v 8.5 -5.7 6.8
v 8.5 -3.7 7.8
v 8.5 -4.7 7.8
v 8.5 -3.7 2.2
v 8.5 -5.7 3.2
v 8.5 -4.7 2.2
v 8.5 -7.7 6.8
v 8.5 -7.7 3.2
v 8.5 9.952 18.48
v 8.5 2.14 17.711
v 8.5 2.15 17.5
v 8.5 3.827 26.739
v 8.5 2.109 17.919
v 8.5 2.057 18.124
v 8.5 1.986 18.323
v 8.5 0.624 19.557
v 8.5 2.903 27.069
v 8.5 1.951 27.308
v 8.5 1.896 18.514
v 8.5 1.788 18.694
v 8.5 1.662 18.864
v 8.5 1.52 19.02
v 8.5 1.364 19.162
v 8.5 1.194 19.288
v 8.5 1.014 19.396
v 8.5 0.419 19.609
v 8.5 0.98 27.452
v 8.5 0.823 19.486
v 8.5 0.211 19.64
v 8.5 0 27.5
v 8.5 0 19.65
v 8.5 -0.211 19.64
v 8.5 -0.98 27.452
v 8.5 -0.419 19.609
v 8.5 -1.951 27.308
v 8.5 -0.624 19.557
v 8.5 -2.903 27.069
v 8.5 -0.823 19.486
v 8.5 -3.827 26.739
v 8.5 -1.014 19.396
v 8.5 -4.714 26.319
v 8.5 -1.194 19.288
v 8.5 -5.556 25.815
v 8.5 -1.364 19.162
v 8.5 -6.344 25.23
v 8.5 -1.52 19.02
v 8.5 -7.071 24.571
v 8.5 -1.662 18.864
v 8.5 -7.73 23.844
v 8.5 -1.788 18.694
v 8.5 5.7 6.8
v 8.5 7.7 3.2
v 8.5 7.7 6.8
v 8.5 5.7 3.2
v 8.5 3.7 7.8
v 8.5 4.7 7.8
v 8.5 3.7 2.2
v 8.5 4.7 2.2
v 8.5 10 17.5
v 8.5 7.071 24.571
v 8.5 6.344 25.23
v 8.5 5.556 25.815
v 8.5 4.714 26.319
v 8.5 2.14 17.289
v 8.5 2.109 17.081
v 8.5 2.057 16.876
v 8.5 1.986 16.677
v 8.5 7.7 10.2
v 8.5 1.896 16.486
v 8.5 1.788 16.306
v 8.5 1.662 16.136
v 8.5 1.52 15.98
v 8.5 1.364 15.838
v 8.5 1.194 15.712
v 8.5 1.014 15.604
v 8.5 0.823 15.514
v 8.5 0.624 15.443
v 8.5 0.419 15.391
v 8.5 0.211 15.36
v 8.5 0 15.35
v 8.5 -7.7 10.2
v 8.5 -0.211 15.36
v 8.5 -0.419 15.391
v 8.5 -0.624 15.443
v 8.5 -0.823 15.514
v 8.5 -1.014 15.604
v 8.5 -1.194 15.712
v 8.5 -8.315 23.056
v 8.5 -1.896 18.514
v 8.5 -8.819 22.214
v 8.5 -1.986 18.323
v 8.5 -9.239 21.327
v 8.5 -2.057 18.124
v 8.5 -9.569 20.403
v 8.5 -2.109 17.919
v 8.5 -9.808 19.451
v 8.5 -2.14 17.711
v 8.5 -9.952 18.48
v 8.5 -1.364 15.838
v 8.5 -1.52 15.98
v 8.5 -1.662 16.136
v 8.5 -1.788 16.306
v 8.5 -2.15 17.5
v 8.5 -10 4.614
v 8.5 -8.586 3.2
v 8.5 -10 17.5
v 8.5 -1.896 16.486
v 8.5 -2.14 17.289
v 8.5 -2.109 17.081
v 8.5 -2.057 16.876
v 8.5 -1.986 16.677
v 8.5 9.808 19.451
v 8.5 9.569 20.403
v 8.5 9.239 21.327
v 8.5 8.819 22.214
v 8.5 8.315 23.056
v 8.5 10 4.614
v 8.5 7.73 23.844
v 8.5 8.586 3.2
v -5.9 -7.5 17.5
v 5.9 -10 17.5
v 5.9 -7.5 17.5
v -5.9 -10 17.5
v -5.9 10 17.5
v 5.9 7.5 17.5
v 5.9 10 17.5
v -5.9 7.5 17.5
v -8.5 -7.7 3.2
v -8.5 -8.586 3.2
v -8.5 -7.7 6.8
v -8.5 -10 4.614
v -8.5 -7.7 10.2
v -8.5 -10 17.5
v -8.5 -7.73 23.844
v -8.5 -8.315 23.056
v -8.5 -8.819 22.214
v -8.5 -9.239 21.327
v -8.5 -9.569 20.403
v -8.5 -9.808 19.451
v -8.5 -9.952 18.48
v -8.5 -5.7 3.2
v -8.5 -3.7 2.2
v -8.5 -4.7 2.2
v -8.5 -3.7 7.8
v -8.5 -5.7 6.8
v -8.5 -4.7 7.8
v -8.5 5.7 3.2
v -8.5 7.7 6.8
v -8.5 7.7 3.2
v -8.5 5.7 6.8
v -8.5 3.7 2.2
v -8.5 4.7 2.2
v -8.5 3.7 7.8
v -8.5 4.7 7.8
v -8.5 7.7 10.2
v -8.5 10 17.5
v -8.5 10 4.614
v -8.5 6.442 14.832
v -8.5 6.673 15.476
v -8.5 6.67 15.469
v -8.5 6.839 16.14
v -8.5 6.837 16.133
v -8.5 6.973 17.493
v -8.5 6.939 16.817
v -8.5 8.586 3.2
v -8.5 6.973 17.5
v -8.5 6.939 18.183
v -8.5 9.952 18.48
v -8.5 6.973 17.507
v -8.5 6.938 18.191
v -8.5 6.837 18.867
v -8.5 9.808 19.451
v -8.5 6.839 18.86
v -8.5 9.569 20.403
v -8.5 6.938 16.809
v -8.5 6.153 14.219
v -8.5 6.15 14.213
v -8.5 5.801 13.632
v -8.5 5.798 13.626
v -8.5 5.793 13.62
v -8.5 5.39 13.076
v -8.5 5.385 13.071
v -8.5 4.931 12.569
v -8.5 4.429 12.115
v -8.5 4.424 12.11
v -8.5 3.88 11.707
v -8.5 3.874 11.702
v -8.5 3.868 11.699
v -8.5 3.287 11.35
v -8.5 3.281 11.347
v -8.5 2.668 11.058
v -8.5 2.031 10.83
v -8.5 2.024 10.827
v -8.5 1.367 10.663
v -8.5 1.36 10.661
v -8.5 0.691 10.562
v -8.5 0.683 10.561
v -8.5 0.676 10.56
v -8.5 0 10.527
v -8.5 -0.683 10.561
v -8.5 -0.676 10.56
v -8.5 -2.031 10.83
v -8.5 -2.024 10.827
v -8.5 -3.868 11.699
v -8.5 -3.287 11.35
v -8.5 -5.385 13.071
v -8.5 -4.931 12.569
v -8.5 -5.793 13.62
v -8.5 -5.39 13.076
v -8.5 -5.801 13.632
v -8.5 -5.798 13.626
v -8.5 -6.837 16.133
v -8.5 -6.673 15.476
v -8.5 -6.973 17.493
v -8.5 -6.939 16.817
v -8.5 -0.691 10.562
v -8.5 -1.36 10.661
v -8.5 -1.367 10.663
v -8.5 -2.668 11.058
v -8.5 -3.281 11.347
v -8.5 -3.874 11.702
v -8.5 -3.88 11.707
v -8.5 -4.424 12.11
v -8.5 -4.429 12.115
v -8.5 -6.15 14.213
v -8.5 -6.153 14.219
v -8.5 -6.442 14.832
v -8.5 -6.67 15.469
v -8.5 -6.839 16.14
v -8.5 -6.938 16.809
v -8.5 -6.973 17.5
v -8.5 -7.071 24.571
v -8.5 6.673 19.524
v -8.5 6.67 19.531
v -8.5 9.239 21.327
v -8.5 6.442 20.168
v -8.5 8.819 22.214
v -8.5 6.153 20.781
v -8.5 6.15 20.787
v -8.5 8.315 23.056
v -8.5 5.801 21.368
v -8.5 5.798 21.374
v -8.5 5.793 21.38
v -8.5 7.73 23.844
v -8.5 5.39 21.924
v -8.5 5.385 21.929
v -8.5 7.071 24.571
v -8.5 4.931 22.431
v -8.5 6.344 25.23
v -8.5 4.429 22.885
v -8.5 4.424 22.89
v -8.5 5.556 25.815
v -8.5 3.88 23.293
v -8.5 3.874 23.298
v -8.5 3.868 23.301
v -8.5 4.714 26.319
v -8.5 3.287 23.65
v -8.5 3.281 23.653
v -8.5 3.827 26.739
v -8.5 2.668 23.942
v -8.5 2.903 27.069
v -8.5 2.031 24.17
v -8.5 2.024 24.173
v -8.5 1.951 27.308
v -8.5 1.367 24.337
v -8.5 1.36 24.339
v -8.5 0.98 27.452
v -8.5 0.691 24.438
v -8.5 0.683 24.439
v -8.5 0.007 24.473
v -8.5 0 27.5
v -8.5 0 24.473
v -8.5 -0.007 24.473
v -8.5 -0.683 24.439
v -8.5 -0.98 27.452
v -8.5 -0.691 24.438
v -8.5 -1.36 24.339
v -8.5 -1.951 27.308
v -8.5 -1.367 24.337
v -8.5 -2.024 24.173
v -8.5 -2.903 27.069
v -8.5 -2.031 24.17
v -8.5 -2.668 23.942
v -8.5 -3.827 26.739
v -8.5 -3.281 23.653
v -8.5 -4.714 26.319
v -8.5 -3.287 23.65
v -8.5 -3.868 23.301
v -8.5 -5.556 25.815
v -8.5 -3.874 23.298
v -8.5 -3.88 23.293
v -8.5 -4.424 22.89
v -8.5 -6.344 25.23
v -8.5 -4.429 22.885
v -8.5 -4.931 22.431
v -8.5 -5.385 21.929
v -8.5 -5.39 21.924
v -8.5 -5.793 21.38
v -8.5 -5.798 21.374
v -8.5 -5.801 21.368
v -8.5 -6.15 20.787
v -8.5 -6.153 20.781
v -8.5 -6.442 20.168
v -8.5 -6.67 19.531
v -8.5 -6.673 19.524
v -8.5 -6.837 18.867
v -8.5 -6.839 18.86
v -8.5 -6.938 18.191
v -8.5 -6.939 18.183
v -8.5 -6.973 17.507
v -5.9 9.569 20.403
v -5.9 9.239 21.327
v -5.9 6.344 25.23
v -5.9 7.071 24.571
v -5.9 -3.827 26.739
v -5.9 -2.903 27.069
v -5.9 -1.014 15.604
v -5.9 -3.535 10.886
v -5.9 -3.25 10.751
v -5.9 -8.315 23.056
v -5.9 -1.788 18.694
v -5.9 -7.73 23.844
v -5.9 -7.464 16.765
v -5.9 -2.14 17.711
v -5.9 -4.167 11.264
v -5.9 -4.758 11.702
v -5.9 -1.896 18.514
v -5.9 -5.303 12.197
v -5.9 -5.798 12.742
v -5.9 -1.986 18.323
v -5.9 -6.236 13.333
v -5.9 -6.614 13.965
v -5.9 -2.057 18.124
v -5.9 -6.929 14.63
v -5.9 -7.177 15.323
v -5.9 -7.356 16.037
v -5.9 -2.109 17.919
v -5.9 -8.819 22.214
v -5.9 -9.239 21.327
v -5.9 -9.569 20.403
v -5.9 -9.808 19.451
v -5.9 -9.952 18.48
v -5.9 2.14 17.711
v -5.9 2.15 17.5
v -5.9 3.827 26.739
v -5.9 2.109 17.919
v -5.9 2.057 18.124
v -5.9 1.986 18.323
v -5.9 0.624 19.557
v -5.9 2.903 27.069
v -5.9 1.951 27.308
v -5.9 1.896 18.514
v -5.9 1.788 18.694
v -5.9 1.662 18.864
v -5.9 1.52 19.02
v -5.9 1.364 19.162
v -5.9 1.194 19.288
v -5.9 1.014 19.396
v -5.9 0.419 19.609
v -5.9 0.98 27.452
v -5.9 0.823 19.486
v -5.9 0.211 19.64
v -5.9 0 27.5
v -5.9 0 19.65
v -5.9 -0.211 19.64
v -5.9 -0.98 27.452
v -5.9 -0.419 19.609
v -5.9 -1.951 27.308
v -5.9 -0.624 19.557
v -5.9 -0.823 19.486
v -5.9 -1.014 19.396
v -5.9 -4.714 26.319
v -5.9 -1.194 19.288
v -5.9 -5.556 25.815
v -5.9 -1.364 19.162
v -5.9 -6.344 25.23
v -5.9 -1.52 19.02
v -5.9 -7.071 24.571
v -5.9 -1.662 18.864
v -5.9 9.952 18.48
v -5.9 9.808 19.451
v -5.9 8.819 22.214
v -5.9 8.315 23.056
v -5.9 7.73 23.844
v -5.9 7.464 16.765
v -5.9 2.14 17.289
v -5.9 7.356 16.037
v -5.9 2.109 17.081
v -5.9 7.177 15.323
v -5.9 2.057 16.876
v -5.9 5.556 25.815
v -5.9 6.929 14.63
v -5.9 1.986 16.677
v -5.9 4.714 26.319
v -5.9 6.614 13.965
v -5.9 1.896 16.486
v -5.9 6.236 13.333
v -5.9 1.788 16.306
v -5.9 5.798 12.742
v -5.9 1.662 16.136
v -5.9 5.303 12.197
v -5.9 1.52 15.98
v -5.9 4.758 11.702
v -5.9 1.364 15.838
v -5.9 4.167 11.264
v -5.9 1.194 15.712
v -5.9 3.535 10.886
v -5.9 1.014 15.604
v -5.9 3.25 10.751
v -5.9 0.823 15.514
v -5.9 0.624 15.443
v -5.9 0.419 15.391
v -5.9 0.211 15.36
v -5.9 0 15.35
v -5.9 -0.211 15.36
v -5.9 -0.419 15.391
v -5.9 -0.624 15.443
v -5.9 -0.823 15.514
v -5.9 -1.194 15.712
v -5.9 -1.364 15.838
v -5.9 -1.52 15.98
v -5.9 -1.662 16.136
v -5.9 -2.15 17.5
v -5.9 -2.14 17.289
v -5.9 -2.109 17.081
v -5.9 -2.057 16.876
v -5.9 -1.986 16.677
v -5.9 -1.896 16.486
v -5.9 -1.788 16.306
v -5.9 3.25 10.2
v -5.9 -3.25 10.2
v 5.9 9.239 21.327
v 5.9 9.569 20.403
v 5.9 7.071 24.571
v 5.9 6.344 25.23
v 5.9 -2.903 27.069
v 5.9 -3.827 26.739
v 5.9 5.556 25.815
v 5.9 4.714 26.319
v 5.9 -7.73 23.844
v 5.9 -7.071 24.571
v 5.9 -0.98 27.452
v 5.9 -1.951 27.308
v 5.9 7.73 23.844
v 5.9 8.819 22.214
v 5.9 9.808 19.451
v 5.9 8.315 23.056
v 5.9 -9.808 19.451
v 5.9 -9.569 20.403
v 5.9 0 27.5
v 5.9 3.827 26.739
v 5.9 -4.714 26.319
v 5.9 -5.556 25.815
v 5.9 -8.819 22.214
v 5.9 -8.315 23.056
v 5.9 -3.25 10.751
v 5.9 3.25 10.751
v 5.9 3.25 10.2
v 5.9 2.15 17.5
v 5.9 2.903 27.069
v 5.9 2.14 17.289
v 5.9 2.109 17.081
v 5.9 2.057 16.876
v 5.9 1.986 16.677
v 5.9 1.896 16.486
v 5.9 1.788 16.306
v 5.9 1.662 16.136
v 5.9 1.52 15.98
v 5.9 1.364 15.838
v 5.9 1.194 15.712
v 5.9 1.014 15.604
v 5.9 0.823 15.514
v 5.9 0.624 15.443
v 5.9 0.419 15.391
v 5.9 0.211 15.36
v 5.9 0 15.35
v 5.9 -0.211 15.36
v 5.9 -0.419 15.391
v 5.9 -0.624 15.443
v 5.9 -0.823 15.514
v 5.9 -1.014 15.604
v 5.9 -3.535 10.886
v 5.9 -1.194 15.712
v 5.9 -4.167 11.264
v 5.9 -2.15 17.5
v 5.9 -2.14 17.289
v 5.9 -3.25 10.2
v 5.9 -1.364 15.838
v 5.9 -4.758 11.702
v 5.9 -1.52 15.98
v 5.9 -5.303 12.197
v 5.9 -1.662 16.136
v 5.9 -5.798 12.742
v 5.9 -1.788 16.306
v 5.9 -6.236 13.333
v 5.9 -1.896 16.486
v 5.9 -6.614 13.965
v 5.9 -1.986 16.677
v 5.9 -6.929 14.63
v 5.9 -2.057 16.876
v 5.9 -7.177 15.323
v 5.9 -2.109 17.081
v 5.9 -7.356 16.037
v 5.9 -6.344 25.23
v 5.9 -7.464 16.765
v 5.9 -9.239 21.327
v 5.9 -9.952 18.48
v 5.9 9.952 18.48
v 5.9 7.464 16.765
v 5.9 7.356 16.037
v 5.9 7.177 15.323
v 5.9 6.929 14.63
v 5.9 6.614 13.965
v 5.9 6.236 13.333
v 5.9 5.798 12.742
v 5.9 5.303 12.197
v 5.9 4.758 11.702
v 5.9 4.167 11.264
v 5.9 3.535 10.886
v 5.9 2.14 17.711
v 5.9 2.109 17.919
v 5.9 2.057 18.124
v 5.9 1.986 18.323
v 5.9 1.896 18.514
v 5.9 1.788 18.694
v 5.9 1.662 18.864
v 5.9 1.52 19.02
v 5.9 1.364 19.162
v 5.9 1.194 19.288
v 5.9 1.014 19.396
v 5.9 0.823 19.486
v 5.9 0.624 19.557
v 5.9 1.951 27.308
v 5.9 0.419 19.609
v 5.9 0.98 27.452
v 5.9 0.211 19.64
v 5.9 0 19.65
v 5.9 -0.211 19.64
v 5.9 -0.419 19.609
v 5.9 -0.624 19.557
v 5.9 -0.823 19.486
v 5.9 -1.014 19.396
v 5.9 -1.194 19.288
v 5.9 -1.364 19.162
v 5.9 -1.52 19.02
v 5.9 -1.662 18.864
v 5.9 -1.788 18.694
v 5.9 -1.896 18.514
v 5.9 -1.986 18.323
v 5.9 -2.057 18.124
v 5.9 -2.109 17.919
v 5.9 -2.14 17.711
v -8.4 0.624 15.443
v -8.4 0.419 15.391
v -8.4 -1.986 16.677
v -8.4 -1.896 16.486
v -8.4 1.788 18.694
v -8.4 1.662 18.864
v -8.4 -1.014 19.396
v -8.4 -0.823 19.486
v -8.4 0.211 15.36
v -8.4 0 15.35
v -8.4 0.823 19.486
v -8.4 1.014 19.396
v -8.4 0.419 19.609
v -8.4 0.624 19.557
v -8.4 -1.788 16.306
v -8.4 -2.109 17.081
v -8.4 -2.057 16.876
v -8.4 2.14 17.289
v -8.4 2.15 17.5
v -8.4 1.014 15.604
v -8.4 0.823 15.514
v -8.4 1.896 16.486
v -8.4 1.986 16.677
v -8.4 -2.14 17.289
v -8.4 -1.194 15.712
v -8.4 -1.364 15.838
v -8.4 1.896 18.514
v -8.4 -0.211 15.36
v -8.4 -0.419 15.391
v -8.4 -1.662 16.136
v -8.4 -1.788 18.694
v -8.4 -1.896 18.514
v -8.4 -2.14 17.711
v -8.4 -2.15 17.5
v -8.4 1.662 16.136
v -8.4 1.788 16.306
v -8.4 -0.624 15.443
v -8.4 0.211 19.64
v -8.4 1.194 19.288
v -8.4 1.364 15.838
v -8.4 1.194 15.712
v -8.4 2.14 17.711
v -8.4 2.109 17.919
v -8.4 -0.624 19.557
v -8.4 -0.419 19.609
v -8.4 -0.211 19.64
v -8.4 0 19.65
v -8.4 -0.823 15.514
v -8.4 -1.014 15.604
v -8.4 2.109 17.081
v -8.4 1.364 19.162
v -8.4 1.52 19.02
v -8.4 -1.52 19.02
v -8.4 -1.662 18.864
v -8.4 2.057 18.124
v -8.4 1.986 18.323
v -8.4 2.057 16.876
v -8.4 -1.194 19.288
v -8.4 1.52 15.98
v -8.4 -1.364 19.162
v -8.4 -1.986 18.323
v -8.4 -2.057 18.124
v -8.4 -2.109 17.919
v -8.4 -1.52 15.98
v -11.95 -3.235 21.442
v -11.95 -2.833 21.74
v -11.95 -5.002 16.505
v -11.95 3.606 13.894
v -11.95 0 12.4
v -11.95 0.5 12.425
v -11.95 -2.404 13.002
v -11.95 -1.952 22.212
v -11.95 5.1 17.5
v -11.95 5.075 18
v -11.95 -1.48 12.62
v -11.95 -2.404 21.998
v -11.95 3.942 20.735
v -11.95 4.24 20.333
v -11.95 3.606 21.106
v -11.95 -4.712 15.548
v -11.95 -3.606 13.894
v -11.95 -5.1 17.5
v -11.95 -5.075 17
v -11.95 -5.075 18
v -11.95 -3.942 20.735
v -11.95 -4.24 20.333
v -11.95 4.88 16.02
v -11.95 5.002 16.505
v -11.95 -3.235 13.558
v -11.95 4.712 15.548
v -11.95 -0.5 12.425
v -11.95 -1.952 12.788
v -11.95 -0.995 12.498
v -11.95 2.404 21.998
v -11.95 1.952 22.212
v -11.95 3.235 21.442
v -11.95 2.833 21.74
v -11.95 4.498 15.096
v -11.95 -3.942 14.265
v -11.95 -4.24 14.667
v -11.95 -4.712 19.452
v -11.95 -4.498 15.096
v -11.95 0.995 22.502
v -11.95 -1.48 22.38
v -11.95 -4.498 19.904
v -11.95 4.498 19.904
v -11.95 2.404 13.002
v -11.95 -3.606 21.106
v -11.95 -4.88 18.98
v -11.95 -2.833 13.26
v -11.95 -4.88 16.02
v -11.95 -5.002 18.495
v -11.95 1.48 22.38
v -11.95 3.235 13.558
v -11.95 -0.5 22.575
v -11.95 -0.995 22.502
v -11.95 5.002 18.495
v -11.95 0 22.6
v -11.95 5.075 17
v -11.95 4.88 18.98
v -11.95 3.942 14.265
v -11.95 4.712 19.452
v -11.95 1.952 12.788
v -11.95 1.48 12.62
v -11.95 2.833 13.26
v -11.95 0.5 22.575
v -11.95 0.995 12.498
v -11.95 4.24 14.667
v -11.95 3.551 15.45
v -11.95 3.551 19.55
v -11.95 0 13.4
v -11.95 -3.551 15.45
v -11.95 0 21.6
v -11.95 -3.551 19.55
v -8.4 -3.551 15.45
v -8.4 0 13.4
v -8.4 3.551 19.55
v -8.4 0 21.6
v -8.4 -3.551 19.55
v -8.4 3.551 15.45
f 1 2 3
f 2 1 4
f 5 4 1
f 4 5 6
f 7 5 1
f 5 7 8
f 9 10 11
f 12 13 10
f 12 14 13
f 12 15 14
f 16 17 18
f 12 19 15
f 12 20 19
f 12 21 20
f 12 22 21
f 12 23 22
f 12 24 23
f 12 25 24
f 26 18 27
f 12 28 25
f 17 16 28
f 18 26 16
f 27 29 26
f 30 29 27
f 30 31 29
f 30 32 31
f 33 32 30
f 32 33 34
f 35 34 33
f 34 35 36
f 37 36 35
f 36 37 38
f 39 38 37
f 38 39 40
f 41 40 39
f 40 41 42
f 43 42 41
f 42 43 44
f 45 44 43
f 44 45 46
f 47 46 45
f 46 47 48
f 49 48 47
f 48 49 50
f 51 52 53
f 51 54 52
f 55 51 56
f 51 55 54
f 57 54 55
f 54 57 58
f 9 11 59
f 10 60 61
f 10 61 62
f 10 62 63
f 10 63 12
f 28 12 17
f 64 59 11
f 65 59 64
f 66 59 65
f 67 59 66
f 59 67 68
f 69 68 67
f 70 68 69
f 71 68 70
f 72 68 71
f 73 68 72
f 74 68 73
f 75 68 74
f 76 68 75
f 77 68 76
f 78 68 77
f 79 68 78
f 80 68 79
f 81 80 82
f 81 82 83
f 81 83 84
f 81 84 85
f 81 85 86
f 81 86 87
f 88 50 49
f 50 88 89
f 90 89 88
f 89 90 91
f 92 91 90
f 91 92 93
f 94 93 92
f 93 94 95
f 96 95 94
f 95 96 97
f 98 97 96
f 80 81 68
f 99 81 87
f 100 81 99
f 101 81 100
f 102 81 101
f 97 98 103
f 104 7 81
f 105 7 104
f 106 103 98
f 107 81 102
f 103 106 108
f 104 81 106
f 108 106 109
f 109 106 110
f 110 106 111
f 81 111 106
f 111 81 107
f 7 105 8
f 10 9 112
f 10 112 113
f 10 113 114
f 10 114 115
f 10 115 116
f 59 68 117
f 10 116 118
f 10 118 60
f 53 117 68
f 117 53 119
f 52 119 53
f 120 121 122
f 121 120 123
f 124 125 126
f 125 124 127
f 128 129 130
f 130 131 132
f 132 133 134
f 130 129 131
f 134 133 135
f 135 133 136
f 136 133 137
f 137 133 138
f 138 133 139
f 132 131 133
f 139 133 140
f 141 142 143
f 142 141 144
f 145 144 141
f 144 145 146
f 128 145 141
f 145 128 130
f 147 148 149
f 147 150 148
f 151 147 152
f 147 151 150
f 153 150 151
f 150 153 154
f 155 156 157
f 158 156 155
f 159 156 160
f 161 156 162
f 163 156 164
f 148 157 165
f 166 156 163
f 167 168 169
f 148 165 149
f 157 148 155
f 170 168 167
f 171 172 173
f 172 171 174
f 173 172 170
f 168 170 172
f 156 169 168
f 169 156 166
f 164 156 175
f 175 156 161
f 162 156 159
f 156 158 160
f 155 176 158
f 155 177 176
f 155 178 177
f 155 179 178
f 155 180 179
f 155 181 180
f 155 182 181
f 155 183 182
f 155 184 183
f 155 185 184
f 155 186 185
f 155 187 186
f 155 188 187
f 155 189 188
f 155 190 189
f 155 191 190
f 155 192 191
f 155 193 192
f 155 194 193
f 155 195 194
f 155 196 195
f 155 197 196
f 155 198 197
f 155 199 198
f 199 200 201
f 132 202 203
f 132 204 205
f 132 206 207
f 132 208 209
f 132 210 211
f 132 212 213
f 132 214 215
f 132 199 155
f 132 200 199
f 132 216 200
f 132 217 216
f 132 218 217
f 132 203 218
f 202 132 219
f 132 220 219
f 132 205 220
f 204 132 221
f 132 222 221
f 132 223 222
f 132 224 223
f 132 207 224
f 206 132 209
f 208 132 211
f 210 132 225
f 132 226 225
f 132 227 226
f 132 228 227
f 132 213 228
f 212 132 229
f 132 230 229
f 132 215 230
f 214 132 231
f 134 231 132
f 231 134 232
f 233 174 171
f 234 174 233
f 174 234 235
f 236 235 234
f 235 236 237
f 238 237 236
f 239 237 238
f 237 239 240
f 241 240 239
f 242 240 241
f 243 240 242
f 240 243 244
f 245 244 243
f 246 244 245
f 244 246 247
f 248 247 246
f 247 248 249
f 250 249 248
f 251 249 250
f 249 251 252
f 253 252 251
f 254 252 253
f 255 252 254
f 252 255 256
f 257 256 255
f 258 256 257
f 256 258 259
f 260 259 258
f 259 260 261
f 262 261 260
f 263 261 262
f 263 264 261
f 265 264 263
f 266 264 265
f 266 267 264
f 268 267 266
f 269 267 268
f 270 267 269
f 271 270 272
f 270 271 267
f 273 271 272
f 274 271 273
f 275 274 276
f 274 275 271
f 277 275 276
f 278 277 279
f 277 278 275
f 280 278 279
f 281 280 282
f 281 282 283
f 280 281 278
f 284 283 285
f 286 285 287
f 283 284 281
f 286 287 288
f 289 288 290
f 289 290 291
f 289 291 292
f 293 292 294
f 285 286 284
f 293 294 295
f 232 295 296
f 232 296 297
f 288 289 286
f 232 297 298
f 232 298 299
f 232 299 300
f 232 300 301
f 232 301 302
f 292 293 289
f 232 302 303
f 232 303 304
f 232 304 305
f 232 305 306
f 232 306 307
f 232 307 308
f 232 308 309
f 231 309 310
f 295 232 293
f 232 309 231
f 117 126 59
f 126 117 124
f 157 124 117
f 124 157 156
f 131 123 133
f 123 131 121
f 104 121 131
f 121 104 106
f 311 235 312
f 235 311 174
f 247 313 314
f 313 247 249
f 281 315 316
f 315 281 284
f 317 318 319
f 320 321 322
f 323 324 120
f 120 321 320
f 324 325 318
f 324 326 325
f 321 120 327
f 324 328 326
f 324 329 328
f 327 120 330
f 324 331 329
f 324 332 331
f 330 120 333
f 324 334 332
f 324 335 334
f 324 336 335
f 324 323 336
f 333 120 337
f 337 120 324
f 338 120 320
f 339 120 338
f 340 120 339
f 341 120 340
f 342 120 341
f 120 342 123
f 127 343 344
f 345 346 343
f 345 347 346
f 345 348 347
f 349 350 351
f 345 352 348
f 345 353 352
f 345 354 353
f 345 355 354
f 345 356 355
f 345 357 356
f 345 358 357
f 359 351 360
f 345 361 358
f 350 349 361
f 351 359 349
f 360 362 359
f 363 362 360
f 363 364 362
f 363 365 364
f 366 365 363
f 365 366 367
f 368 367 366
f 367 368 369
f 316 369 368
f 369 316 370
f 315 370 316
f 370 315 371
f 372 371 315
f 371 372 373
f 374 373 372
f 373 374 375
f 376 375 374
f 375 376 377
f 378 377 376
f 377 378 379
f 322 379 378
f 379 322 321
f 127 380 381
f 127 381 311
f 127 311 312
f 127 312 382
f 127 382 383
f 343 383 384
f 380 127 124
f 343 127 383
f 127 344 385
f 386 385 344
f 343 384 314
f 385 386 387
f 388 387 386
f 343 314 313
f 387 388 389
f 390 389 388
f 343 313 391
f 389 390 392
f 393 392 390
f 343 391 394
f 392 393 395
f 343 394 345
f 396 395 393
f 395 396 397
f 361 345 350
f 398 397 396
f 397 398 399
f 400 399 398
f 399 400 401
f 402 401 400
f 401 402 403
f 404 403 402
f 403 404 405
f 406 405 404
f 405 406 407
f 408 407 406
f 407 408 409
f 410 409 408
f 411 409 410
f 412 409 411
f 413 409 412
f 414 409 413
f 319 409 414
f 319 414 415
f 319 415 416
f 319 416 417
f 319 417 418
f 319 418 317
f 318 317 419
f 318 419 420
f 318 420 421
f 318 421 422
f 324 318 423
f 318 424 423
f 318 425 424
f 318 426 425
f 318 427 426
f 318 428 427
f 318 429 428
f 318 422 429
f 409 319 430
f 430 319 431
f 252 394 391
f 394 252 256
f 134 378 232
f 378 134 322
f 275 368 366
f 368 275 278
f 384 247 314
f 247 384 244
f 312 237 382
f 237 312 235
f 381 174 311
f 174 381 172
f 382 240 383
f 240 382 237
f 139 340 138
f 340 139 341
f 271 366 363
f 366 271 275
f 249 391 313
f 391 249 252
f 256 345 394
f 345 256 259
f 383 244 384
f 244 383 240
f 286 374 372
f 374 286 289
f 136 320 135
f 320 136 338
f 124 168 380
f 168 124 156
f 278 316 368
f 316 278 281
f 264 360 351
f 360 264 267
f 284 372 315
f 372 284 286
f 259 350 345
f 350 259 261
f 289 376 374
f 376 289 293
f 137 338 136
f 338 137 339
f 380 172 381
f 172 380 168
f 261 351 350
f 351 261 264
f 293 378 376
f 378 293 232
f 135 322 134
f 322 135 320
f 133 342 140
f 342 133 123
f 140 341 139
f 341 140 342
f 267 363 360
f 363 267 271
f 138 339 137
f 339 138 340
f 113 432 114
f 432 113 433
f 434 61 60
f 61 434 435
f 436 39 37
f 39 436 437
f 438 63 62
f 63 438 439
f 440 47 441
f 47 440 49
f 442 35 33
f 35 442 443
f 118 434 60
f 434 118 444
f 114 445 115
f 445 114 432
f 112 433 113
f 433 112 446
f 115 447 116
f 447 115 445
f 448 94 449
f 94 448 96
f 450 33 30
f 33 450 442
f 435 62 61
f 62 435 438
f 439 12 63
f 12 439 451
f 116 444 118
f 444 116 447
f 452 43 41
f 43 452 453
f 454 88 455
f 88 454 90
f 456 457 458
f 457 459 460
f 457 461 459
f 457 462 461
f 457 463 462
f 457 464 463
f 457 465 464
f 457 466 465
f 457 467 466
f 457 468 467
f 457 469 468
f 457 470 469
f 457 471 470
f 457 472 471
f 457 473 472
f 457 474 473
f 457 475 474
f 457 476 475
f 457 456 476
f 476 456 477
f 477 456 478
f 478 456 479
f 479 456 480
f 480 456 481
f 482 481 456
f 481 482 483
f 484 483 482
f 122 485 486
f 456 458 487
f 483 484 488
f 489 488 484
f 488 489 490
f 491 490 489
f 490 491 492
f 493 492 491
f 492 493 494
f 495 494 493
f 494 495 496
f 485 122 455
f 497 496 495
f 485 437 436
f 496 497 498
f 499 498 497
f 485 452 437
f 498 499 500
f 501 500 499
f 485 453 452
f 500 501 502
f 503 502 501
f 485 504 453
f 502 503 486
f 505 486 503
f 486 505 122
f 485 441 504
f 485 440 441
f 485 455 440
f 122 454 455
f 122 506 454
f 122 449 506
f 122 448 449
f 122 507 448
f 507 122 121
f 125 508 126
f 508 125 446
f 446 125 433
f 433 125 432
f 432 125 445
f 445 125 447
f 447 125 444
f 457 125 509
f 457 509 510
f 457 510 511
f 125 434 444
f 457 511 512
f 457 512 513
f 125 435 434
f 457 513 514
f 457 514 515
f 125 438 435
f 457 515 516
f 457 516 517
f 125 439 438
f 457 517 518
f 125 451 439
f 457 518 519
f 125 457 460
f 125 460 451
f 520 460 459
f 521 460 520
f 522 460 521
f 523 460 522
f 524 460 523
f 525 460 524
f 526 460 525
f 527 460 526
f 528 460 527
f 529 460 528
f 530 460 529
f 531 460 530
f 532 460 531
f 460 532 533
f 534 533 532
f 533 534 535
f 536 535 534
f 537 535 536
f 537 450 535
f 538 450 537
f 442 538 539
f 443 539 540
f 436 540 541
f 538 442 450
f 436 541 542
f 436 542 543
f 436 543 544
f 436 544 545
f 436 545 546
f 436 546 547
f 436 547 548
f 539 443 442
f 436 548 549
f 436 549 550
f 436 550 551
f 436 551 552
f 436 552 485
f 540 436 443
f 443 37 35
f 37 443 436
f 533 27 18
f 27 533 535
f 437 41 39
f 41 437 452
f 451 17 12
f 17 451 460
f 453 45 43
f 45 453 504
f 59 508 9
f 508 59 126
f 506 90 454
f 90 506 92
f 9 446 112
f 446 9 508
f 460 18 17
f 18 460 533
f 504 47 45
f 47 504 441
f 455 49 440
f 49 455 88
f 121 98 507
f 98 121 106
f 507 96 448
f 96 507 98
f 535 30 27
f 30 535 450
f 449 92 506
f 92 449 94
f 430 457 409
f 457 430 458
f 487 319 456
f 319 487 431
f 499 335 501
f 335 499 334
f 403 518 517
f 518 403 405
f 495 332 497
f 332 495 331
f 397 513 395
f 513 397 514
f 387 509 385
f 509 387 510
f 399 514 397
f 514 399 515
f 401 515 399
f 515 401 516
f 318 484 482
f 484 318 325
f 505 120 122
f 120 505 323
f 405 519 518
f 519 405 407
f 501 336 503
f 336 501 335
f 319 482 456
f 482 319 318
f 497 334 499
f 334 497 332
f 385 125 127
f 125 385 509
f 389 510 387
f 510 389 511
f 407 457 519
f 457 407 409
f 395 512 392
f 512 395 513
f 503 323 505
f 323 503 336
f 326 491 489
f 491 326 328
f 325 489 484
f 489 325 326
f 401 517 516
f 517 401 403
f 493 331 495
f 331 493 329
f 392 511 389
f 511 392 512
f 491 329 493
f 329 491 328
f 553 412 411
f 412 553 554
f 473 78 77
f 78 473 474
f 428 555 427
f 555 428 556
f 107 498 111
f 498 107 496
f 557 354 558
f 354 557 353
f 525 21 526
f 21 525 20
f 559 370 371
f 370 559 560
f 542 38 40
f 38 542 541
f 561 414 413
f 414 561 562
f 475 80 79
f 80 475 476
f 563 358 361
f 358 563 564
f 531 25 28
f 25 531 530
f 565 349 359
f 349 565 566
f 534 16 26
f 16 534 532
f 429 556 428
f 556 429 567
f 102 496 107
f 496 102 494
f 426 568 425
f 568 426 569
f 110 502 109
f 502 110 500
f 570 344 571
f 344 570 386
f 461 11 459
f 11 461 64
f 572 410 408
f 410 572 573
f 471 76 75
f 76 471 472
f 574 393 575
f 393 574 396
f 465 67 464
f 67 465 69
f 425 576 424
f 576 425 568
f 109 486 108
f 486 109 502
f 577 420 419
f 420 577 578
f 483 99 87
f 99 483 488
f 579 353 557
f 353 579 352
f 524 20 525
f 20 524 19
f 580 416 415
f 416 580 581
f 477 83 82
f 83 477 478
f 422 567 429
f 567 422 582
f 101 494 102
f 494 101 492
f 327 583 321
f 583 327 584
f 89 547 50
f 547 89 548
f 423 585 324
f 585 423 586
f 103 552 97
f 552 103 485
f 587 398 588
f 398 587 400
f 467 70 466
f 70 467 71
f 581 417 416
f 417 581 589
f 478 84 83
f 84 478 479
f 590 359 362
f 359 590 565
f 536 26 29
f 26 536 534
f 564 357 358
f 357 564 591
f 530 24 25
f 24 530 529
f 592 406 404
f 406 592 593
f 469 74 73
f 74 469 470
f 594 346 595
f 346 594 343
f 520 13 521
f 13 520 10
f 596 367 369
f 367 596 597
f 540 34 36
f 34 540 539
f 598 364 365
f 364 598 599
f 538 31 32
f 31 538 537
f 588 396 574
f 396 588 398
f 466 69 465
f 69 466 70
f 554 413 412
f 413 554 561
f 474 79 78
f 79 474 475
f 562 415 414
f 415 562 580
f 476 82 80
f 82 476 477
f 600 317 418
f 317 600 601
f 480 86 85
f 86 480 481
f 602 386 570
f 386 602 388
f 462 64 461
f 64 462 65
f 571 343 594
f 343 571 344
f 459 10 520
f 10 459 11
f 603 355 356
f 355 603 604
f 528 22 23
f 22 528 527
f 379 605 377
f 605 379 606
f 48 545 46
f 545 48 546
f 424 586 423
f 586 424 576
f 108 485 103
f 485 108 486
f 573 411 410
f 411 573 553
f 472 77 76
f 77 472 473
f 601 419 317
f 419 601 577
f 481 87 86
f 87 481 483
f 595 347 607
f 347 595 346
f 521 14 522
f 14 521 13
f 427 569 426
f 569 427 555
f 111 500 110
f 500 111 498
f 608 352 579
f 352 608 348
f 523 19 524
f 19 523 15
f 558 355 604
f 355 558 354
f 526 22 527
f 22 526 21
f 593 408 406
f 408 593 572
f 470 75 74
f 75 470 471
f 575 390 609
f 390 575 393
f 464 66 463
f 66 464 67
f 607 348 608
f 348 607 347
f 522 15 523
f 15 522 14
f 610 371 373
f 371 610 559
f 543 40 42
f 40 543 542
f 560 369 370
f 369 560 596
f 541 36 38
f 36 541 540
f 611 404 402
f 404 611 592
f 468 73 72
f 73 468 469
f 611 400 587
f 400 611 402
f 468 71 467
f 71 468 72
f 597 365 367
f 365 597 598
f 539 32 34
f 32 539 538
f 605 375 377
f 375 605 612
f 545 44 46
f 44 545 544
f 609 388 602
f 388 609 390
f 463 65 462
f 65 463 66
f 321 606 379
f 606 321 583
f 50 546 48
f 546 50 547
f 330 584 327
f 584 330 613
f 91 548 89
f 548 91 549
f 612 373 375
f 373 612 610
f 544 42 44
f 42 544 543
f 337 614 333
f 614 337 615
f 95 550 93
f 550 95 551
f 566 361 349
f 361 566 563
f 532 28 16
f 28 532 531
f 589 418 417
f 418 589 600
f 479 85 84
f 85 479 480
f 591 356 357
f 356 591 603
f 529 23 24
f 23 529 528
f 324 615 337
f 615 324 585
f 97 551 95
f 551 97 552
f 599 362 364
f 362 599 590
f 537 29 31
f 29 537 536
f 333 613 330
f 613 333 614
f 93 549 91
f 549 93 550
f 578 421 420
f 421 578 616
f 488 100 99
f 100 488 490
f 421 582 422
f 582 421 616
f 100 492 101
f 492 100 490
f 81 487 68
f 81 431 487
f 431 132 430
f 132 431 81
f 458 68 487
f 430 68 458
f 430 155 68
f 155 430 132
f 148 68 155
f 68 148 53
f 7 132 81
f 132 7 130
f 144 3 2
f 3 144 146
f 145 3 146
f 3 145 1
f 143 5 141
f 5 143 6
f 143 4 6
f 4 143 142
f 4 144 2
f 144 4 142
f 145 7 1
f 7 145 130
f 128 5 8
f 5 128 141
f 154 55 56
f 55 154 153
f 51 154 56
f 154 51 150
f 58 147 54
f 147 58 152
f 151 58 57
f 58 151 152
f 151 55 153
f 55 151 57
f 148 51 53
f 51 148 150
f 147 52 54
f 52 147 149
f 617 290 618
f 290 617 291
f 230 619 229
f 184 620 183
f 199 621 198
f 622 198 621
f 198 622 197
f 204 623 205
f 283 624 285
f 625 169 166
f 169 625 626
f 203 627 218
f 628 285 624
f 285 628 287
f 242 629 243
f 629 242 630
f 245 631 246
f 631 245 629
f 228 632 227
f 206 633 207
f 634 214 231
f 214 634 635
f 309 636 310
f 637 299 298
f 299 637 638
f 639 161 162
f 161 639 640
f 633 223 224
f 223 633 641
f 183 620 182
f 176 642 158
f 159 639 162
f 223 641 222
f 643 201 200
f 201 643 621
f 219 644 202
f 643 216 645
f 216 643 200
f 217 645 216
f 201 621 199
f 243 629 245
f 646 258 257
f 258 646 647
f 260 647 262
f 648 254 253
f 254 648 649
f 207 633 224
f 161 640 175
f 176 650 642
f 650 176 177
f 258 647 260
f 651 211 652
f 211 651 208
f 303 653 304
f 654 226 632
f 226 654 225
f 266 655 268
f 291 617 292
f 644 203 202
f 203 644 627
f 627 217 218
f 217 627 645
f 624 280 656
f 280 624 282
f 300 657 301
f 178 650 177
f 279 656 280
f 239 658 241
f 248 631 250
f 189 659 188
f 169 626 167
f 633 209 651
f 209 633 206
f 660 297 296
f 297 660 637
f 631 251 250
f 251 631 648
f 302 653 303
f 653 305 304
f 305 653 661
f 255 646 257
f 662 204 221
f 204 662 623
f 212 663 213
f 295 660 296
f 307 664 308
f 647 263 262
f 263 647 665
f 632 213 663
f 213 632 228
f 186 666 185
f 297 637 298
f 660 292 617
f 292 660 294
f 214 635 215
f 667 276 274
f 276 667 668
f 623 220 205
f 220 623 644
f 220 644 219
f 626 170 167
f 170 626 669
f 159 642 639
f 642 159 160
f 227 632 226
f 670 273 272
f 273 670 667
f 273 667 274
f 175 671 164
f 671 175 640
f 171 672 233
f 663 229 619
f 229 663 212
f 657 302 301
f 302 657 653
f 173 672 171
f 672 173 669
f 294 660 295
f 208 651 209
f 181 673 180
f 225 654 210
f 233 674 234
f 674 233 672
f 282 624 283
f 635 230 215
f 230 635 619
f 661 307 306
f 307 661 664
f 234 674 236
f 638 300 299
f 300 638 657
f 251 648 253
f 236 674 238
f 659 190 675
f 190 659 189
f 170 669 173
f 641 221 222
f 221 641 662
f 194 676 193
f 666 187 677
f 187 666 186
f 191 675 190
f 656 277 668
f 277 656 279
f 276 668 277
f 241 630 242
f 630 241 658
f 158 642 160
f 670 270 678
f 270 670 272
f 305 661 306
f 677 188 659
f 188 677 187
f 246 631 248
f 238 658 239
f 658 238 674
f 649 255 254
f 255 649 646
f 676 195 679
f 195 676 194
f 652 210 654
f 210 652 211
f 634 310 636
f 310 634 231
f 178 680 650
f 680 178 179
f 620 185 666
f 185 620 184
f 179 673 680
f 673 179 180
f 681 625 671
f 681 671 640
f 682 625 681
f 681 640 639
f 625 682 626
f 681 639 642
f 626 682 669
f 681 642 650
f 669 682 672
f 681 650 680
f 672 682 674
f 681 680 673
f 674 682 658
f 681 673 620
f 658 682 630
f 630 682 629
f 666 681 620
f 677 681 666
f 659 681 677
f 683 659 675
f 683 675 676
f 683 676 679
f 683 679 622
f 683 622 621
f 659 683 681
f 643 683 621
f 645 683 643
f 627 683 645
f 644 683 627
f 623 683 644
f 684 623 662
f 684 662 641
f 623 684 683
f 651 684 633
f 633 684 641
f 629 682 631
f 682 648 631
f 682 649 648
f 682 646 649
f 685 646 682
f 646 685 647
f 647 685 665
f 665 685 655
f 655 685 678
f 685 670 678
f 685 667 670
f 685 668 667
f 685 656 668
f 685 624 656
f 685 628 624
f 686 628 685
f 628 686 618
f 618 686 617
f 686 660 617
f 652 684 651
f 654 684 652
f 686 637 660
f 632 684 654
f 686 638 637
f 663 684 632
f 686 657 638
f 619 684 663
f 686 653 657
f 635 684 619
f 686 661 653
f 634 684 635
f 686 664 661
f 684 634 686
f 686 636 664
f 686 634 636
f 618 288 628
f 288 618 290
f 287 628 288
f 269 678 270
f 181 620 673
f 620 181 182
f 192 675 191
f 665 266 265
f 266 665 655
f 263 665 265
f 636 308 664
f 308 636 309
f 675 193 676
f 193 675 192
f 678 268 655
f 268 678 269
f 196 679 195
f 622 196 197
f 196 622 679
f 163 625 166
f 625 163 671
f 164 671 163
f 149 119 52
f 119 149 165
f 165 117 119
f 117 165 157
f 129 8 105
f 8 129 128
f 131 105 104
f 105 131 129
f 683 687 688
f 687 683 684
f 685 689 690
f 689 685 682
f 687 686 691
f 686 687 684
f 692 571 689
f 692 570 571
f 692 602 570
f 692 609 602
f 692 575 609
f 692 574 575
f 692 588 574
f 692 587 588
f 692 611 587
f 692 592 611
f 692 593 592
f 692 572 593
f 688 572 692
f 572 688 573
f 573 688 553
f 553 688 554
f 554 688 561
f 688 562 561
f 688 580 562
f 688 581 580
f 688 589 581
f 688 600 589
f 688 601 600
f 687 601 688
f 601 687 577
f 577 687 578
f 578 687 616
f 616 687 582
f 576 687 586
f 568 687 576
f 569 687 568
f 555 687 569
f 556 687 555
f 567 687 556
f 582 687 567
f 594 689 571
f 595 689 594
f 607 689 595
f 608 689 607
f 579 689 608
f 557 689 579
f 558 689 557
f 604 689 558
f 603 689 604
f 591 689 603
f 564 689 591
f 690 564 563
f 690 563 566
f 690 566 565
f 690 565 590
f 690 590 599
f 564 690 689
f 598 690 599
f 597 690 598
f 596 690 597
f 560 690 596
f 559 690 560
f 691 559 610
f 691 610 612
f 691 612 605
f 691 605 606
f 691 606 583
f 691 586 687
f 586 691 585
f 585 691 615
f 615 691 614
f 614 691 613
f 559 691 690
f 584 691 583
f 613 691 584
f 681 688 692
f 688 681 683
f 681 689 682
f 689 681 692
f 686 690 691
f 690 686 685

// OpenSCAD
// (C) Radus Linuxbashev 2015
// http://vk.com/linuxbashev

lay=0.2;

m4d=4+0.3;
m4nd = 7.8+0.4;
m4nh=3.4;
m4shd=8.9+0.7;


x=70;				// x length
y=130;			//	y length

bwx=60;			// spool height between sliders
bwy=110;			//	Y length beetween rails

z=3;				// height of base
ry=15;			// rail width

wx=15;			// base part size
wz=10;			// rail height

w=2;


slx=12+5;			// spool rollers X size
slx1=5+5+0.9+0.9;	// roller bearing height with washings

d1=13;		// diameter roller bearings
d2=20;		// diameter flange rollers
d3=d2;		// diameter flange rollers2

dk=205;

osz=wz+1+d1/2;

z2=13;

pw=1;
pw1=1;
py=4;
pph1=wz-4;
pph2=wz-6;

fs=2;

$fn=64;

//---------------------------
module paz(px, ppy, pz, ph) {
difference() {
union() {
hull() {
translate([0,ppy-pw-pw1/2,0]) cube([px, pw1, ph], true);
translate([0,ppy-pw/2,0]) cube([px, pw, pz], true);
} // hl
translate([0,ppy/2-ppy/4,0]) cube([px, ppy, ph], true);
} // un

} // df
} // mod paz;


module sph() {
difference() {
union() {
for (mx=[0,1]) mirror([mx,0,0])
translate([-x/2, 0, z/2]) cube([wx, y, z], true);

for (my=[0,1]) mirror([0,my,0])
for (mx=[0,1]) mirror([mx,0,0])
translate([-x/2, -y/2, z/2]) cylinder(z, wx/2, wx/2, true);

for (my=[0,1]) mirror([0,my,0])
translate([0,bwy/2, (wz+z)/2]) cube([x+wx, ry, wz+z], true);

} // un

for (myy=[0,1]) mirror([0,myy,0])
translate([0,bwy/2,0])
for (my=[0,1]) mirror([0,my,0])
translate([0,-ry/2,z+wz/2]) paz(x+wx+1, py, pph1, pph2);

for (mx=[0,1]) mirror([mx,0,0])
for (my=[0,1]) mirror([0,my,0])
translate([0,-bwy/2,0])
for (myy=[0,1]) mirror([0,myy,0])
translate([-x/2-wx/2, -ry/2, z+wz/2+0.1]) rotate([0,0,45]) cube([fs, fs, wz+0.2], true);

} // df
} // mod sph


module spsl() {
difference() {
union() {
translate([0,0,osz/2]) cube([slx, d2, osz], true);
translate([-slx/2+(slx-slx1)/4,0,osz]) rotate([0,90,0]) cylinder((slx-slx1)/2, d3/2, d3/2, true);

translate([+slx/2-(slx-slx1)/4,0,osz]) rotate([0,90,0]) cylinder((slx-slx1)/2, d3/2, d3/2, true);
} // un

%translate([0,0,osz]) rotate([0,90,0]) cylinder(slx1, d1/2, d1/2, true);


translate([0,0,osz+d2/2]) cube([slx1, d2+1, d2], true);

translate([0,0,osz-d1/2]) cube([slx1, d1/2, d1], true);

translate([0,0,osz]) rotate([0,90,0]) cylinder(slx1, d1/2+1, d1/2+1, true);

translate([0,0,osz]) rotate([0,90,0]) cylinder(slx+1, m4d/2, m4d/2, true);


translate([0,0,wz/2]) cube([slx+1, ry+lay*2, wz+lay*2], true);
} // df
} // mod spsl

module spsl1() {
difference() {
union() {
spsl();
translate([-slx/2-m4nh/2, 0, osz]) rotate([0,90,0]) cylinder(m4nh+0.1, m4nd/2+1, d3/2-3, true);

for (my=[0,1]) mirror([0,my,0])
translate([0,-ry/2,wz/2]) paz(slx, py-lay, pph1-lay*2, pph2-lay*2);

} // un

translate([-slx/2-m4nh, 0, osz]) rotate([0,90,0]) cylinder(m4nh*2+0.2, m4nd/2, m4nd/2, true, $fn=6);

for (my=[0,1]) mirror([0,my,0]) {
translate([-slx/2-1,d2/2-(d2-ry)+1.5,(wz-pph2+lay*2)/2]) mirror([0,0,1]) cube([slx+2, (d2-ry), wz]);
translate([0,d2/2,(wz-pph2+lay*2)/2]) rotate([45,0,0]) cube([slx+1, fs, fs], true);
} // for

//translate([slx/2,0,osz]) rotate([45,0,0]) translate([0,d2/2+d1/2,0]) cube([slx, d2, d2], true);

} // df
} // mod spsl1


module spsl22() {
difference() {
union() {
translate([0,0,z2/2]) cube([slx, d2, z2], true);

for (my=[0,1]) mirror([0,my,0]) {
translate([0,-d2/2,z2+w]) rotate([-90,0,0]) cylinder((d2-ry)/2, slx/2, slx/2);
translate([0,-d2/2+((d2-ry)/2)/2,z2]) cube([slx, (d2-ry)/2, w*2], true);
} // for

} // un

translate([0,0,z2+w]) rotate([-90,0,0]) cylinder(d2+1, 2.5/2, 2.5/2, $fn=8, true);

translate([0,0,wz/2]) cube([slx+1, ry+lay*2, wz+lay*4], true);




} // df
} // mod spsl

module spsl2() {
difference() {
union() {
spsl22();

for (my=[0,1]) mirror([0,my,0])
translate([0,-ry/2,wz/2]) paz(slx, py-lay, pph1-lay*2, pph2-lay*2);

} // un


for (my=[0,1]) mirror([0,my,0]) {
translate([-slx/2-1,d2/2-(d2-ry)+1.5,(wz-pph2+lay*2)/2]) mirror([0,0,1]) cube([slx+2, (d2-ry), wz]);
translate([0,d2/2,(wz-pph2+lay*2)/2]) rotate([45,0,0]) cube([slx+1, fs, fs], true);
} // for

//translate([slx/2,0,osz]) rotate([45,0,0]) translate([0,d2/2+d1/2,0]) cube([slx, d2, d2], true);

} // df
} // mod spsl2



// ---------------------------

//%translate([0,0,dk/2+12]) rotate([0,90,0]) cylinder(bwx, dk/2, dk/2, true);

//sph();

//for (my=[0,1]) mirror([0,my,0])
//for (mx=[0,1]) mirror([mx,0,0])
//translate([-bwx/2, -bwy/2, z])
spsl1();

//translate([0, -bwy/2, z])
//spsl2();
